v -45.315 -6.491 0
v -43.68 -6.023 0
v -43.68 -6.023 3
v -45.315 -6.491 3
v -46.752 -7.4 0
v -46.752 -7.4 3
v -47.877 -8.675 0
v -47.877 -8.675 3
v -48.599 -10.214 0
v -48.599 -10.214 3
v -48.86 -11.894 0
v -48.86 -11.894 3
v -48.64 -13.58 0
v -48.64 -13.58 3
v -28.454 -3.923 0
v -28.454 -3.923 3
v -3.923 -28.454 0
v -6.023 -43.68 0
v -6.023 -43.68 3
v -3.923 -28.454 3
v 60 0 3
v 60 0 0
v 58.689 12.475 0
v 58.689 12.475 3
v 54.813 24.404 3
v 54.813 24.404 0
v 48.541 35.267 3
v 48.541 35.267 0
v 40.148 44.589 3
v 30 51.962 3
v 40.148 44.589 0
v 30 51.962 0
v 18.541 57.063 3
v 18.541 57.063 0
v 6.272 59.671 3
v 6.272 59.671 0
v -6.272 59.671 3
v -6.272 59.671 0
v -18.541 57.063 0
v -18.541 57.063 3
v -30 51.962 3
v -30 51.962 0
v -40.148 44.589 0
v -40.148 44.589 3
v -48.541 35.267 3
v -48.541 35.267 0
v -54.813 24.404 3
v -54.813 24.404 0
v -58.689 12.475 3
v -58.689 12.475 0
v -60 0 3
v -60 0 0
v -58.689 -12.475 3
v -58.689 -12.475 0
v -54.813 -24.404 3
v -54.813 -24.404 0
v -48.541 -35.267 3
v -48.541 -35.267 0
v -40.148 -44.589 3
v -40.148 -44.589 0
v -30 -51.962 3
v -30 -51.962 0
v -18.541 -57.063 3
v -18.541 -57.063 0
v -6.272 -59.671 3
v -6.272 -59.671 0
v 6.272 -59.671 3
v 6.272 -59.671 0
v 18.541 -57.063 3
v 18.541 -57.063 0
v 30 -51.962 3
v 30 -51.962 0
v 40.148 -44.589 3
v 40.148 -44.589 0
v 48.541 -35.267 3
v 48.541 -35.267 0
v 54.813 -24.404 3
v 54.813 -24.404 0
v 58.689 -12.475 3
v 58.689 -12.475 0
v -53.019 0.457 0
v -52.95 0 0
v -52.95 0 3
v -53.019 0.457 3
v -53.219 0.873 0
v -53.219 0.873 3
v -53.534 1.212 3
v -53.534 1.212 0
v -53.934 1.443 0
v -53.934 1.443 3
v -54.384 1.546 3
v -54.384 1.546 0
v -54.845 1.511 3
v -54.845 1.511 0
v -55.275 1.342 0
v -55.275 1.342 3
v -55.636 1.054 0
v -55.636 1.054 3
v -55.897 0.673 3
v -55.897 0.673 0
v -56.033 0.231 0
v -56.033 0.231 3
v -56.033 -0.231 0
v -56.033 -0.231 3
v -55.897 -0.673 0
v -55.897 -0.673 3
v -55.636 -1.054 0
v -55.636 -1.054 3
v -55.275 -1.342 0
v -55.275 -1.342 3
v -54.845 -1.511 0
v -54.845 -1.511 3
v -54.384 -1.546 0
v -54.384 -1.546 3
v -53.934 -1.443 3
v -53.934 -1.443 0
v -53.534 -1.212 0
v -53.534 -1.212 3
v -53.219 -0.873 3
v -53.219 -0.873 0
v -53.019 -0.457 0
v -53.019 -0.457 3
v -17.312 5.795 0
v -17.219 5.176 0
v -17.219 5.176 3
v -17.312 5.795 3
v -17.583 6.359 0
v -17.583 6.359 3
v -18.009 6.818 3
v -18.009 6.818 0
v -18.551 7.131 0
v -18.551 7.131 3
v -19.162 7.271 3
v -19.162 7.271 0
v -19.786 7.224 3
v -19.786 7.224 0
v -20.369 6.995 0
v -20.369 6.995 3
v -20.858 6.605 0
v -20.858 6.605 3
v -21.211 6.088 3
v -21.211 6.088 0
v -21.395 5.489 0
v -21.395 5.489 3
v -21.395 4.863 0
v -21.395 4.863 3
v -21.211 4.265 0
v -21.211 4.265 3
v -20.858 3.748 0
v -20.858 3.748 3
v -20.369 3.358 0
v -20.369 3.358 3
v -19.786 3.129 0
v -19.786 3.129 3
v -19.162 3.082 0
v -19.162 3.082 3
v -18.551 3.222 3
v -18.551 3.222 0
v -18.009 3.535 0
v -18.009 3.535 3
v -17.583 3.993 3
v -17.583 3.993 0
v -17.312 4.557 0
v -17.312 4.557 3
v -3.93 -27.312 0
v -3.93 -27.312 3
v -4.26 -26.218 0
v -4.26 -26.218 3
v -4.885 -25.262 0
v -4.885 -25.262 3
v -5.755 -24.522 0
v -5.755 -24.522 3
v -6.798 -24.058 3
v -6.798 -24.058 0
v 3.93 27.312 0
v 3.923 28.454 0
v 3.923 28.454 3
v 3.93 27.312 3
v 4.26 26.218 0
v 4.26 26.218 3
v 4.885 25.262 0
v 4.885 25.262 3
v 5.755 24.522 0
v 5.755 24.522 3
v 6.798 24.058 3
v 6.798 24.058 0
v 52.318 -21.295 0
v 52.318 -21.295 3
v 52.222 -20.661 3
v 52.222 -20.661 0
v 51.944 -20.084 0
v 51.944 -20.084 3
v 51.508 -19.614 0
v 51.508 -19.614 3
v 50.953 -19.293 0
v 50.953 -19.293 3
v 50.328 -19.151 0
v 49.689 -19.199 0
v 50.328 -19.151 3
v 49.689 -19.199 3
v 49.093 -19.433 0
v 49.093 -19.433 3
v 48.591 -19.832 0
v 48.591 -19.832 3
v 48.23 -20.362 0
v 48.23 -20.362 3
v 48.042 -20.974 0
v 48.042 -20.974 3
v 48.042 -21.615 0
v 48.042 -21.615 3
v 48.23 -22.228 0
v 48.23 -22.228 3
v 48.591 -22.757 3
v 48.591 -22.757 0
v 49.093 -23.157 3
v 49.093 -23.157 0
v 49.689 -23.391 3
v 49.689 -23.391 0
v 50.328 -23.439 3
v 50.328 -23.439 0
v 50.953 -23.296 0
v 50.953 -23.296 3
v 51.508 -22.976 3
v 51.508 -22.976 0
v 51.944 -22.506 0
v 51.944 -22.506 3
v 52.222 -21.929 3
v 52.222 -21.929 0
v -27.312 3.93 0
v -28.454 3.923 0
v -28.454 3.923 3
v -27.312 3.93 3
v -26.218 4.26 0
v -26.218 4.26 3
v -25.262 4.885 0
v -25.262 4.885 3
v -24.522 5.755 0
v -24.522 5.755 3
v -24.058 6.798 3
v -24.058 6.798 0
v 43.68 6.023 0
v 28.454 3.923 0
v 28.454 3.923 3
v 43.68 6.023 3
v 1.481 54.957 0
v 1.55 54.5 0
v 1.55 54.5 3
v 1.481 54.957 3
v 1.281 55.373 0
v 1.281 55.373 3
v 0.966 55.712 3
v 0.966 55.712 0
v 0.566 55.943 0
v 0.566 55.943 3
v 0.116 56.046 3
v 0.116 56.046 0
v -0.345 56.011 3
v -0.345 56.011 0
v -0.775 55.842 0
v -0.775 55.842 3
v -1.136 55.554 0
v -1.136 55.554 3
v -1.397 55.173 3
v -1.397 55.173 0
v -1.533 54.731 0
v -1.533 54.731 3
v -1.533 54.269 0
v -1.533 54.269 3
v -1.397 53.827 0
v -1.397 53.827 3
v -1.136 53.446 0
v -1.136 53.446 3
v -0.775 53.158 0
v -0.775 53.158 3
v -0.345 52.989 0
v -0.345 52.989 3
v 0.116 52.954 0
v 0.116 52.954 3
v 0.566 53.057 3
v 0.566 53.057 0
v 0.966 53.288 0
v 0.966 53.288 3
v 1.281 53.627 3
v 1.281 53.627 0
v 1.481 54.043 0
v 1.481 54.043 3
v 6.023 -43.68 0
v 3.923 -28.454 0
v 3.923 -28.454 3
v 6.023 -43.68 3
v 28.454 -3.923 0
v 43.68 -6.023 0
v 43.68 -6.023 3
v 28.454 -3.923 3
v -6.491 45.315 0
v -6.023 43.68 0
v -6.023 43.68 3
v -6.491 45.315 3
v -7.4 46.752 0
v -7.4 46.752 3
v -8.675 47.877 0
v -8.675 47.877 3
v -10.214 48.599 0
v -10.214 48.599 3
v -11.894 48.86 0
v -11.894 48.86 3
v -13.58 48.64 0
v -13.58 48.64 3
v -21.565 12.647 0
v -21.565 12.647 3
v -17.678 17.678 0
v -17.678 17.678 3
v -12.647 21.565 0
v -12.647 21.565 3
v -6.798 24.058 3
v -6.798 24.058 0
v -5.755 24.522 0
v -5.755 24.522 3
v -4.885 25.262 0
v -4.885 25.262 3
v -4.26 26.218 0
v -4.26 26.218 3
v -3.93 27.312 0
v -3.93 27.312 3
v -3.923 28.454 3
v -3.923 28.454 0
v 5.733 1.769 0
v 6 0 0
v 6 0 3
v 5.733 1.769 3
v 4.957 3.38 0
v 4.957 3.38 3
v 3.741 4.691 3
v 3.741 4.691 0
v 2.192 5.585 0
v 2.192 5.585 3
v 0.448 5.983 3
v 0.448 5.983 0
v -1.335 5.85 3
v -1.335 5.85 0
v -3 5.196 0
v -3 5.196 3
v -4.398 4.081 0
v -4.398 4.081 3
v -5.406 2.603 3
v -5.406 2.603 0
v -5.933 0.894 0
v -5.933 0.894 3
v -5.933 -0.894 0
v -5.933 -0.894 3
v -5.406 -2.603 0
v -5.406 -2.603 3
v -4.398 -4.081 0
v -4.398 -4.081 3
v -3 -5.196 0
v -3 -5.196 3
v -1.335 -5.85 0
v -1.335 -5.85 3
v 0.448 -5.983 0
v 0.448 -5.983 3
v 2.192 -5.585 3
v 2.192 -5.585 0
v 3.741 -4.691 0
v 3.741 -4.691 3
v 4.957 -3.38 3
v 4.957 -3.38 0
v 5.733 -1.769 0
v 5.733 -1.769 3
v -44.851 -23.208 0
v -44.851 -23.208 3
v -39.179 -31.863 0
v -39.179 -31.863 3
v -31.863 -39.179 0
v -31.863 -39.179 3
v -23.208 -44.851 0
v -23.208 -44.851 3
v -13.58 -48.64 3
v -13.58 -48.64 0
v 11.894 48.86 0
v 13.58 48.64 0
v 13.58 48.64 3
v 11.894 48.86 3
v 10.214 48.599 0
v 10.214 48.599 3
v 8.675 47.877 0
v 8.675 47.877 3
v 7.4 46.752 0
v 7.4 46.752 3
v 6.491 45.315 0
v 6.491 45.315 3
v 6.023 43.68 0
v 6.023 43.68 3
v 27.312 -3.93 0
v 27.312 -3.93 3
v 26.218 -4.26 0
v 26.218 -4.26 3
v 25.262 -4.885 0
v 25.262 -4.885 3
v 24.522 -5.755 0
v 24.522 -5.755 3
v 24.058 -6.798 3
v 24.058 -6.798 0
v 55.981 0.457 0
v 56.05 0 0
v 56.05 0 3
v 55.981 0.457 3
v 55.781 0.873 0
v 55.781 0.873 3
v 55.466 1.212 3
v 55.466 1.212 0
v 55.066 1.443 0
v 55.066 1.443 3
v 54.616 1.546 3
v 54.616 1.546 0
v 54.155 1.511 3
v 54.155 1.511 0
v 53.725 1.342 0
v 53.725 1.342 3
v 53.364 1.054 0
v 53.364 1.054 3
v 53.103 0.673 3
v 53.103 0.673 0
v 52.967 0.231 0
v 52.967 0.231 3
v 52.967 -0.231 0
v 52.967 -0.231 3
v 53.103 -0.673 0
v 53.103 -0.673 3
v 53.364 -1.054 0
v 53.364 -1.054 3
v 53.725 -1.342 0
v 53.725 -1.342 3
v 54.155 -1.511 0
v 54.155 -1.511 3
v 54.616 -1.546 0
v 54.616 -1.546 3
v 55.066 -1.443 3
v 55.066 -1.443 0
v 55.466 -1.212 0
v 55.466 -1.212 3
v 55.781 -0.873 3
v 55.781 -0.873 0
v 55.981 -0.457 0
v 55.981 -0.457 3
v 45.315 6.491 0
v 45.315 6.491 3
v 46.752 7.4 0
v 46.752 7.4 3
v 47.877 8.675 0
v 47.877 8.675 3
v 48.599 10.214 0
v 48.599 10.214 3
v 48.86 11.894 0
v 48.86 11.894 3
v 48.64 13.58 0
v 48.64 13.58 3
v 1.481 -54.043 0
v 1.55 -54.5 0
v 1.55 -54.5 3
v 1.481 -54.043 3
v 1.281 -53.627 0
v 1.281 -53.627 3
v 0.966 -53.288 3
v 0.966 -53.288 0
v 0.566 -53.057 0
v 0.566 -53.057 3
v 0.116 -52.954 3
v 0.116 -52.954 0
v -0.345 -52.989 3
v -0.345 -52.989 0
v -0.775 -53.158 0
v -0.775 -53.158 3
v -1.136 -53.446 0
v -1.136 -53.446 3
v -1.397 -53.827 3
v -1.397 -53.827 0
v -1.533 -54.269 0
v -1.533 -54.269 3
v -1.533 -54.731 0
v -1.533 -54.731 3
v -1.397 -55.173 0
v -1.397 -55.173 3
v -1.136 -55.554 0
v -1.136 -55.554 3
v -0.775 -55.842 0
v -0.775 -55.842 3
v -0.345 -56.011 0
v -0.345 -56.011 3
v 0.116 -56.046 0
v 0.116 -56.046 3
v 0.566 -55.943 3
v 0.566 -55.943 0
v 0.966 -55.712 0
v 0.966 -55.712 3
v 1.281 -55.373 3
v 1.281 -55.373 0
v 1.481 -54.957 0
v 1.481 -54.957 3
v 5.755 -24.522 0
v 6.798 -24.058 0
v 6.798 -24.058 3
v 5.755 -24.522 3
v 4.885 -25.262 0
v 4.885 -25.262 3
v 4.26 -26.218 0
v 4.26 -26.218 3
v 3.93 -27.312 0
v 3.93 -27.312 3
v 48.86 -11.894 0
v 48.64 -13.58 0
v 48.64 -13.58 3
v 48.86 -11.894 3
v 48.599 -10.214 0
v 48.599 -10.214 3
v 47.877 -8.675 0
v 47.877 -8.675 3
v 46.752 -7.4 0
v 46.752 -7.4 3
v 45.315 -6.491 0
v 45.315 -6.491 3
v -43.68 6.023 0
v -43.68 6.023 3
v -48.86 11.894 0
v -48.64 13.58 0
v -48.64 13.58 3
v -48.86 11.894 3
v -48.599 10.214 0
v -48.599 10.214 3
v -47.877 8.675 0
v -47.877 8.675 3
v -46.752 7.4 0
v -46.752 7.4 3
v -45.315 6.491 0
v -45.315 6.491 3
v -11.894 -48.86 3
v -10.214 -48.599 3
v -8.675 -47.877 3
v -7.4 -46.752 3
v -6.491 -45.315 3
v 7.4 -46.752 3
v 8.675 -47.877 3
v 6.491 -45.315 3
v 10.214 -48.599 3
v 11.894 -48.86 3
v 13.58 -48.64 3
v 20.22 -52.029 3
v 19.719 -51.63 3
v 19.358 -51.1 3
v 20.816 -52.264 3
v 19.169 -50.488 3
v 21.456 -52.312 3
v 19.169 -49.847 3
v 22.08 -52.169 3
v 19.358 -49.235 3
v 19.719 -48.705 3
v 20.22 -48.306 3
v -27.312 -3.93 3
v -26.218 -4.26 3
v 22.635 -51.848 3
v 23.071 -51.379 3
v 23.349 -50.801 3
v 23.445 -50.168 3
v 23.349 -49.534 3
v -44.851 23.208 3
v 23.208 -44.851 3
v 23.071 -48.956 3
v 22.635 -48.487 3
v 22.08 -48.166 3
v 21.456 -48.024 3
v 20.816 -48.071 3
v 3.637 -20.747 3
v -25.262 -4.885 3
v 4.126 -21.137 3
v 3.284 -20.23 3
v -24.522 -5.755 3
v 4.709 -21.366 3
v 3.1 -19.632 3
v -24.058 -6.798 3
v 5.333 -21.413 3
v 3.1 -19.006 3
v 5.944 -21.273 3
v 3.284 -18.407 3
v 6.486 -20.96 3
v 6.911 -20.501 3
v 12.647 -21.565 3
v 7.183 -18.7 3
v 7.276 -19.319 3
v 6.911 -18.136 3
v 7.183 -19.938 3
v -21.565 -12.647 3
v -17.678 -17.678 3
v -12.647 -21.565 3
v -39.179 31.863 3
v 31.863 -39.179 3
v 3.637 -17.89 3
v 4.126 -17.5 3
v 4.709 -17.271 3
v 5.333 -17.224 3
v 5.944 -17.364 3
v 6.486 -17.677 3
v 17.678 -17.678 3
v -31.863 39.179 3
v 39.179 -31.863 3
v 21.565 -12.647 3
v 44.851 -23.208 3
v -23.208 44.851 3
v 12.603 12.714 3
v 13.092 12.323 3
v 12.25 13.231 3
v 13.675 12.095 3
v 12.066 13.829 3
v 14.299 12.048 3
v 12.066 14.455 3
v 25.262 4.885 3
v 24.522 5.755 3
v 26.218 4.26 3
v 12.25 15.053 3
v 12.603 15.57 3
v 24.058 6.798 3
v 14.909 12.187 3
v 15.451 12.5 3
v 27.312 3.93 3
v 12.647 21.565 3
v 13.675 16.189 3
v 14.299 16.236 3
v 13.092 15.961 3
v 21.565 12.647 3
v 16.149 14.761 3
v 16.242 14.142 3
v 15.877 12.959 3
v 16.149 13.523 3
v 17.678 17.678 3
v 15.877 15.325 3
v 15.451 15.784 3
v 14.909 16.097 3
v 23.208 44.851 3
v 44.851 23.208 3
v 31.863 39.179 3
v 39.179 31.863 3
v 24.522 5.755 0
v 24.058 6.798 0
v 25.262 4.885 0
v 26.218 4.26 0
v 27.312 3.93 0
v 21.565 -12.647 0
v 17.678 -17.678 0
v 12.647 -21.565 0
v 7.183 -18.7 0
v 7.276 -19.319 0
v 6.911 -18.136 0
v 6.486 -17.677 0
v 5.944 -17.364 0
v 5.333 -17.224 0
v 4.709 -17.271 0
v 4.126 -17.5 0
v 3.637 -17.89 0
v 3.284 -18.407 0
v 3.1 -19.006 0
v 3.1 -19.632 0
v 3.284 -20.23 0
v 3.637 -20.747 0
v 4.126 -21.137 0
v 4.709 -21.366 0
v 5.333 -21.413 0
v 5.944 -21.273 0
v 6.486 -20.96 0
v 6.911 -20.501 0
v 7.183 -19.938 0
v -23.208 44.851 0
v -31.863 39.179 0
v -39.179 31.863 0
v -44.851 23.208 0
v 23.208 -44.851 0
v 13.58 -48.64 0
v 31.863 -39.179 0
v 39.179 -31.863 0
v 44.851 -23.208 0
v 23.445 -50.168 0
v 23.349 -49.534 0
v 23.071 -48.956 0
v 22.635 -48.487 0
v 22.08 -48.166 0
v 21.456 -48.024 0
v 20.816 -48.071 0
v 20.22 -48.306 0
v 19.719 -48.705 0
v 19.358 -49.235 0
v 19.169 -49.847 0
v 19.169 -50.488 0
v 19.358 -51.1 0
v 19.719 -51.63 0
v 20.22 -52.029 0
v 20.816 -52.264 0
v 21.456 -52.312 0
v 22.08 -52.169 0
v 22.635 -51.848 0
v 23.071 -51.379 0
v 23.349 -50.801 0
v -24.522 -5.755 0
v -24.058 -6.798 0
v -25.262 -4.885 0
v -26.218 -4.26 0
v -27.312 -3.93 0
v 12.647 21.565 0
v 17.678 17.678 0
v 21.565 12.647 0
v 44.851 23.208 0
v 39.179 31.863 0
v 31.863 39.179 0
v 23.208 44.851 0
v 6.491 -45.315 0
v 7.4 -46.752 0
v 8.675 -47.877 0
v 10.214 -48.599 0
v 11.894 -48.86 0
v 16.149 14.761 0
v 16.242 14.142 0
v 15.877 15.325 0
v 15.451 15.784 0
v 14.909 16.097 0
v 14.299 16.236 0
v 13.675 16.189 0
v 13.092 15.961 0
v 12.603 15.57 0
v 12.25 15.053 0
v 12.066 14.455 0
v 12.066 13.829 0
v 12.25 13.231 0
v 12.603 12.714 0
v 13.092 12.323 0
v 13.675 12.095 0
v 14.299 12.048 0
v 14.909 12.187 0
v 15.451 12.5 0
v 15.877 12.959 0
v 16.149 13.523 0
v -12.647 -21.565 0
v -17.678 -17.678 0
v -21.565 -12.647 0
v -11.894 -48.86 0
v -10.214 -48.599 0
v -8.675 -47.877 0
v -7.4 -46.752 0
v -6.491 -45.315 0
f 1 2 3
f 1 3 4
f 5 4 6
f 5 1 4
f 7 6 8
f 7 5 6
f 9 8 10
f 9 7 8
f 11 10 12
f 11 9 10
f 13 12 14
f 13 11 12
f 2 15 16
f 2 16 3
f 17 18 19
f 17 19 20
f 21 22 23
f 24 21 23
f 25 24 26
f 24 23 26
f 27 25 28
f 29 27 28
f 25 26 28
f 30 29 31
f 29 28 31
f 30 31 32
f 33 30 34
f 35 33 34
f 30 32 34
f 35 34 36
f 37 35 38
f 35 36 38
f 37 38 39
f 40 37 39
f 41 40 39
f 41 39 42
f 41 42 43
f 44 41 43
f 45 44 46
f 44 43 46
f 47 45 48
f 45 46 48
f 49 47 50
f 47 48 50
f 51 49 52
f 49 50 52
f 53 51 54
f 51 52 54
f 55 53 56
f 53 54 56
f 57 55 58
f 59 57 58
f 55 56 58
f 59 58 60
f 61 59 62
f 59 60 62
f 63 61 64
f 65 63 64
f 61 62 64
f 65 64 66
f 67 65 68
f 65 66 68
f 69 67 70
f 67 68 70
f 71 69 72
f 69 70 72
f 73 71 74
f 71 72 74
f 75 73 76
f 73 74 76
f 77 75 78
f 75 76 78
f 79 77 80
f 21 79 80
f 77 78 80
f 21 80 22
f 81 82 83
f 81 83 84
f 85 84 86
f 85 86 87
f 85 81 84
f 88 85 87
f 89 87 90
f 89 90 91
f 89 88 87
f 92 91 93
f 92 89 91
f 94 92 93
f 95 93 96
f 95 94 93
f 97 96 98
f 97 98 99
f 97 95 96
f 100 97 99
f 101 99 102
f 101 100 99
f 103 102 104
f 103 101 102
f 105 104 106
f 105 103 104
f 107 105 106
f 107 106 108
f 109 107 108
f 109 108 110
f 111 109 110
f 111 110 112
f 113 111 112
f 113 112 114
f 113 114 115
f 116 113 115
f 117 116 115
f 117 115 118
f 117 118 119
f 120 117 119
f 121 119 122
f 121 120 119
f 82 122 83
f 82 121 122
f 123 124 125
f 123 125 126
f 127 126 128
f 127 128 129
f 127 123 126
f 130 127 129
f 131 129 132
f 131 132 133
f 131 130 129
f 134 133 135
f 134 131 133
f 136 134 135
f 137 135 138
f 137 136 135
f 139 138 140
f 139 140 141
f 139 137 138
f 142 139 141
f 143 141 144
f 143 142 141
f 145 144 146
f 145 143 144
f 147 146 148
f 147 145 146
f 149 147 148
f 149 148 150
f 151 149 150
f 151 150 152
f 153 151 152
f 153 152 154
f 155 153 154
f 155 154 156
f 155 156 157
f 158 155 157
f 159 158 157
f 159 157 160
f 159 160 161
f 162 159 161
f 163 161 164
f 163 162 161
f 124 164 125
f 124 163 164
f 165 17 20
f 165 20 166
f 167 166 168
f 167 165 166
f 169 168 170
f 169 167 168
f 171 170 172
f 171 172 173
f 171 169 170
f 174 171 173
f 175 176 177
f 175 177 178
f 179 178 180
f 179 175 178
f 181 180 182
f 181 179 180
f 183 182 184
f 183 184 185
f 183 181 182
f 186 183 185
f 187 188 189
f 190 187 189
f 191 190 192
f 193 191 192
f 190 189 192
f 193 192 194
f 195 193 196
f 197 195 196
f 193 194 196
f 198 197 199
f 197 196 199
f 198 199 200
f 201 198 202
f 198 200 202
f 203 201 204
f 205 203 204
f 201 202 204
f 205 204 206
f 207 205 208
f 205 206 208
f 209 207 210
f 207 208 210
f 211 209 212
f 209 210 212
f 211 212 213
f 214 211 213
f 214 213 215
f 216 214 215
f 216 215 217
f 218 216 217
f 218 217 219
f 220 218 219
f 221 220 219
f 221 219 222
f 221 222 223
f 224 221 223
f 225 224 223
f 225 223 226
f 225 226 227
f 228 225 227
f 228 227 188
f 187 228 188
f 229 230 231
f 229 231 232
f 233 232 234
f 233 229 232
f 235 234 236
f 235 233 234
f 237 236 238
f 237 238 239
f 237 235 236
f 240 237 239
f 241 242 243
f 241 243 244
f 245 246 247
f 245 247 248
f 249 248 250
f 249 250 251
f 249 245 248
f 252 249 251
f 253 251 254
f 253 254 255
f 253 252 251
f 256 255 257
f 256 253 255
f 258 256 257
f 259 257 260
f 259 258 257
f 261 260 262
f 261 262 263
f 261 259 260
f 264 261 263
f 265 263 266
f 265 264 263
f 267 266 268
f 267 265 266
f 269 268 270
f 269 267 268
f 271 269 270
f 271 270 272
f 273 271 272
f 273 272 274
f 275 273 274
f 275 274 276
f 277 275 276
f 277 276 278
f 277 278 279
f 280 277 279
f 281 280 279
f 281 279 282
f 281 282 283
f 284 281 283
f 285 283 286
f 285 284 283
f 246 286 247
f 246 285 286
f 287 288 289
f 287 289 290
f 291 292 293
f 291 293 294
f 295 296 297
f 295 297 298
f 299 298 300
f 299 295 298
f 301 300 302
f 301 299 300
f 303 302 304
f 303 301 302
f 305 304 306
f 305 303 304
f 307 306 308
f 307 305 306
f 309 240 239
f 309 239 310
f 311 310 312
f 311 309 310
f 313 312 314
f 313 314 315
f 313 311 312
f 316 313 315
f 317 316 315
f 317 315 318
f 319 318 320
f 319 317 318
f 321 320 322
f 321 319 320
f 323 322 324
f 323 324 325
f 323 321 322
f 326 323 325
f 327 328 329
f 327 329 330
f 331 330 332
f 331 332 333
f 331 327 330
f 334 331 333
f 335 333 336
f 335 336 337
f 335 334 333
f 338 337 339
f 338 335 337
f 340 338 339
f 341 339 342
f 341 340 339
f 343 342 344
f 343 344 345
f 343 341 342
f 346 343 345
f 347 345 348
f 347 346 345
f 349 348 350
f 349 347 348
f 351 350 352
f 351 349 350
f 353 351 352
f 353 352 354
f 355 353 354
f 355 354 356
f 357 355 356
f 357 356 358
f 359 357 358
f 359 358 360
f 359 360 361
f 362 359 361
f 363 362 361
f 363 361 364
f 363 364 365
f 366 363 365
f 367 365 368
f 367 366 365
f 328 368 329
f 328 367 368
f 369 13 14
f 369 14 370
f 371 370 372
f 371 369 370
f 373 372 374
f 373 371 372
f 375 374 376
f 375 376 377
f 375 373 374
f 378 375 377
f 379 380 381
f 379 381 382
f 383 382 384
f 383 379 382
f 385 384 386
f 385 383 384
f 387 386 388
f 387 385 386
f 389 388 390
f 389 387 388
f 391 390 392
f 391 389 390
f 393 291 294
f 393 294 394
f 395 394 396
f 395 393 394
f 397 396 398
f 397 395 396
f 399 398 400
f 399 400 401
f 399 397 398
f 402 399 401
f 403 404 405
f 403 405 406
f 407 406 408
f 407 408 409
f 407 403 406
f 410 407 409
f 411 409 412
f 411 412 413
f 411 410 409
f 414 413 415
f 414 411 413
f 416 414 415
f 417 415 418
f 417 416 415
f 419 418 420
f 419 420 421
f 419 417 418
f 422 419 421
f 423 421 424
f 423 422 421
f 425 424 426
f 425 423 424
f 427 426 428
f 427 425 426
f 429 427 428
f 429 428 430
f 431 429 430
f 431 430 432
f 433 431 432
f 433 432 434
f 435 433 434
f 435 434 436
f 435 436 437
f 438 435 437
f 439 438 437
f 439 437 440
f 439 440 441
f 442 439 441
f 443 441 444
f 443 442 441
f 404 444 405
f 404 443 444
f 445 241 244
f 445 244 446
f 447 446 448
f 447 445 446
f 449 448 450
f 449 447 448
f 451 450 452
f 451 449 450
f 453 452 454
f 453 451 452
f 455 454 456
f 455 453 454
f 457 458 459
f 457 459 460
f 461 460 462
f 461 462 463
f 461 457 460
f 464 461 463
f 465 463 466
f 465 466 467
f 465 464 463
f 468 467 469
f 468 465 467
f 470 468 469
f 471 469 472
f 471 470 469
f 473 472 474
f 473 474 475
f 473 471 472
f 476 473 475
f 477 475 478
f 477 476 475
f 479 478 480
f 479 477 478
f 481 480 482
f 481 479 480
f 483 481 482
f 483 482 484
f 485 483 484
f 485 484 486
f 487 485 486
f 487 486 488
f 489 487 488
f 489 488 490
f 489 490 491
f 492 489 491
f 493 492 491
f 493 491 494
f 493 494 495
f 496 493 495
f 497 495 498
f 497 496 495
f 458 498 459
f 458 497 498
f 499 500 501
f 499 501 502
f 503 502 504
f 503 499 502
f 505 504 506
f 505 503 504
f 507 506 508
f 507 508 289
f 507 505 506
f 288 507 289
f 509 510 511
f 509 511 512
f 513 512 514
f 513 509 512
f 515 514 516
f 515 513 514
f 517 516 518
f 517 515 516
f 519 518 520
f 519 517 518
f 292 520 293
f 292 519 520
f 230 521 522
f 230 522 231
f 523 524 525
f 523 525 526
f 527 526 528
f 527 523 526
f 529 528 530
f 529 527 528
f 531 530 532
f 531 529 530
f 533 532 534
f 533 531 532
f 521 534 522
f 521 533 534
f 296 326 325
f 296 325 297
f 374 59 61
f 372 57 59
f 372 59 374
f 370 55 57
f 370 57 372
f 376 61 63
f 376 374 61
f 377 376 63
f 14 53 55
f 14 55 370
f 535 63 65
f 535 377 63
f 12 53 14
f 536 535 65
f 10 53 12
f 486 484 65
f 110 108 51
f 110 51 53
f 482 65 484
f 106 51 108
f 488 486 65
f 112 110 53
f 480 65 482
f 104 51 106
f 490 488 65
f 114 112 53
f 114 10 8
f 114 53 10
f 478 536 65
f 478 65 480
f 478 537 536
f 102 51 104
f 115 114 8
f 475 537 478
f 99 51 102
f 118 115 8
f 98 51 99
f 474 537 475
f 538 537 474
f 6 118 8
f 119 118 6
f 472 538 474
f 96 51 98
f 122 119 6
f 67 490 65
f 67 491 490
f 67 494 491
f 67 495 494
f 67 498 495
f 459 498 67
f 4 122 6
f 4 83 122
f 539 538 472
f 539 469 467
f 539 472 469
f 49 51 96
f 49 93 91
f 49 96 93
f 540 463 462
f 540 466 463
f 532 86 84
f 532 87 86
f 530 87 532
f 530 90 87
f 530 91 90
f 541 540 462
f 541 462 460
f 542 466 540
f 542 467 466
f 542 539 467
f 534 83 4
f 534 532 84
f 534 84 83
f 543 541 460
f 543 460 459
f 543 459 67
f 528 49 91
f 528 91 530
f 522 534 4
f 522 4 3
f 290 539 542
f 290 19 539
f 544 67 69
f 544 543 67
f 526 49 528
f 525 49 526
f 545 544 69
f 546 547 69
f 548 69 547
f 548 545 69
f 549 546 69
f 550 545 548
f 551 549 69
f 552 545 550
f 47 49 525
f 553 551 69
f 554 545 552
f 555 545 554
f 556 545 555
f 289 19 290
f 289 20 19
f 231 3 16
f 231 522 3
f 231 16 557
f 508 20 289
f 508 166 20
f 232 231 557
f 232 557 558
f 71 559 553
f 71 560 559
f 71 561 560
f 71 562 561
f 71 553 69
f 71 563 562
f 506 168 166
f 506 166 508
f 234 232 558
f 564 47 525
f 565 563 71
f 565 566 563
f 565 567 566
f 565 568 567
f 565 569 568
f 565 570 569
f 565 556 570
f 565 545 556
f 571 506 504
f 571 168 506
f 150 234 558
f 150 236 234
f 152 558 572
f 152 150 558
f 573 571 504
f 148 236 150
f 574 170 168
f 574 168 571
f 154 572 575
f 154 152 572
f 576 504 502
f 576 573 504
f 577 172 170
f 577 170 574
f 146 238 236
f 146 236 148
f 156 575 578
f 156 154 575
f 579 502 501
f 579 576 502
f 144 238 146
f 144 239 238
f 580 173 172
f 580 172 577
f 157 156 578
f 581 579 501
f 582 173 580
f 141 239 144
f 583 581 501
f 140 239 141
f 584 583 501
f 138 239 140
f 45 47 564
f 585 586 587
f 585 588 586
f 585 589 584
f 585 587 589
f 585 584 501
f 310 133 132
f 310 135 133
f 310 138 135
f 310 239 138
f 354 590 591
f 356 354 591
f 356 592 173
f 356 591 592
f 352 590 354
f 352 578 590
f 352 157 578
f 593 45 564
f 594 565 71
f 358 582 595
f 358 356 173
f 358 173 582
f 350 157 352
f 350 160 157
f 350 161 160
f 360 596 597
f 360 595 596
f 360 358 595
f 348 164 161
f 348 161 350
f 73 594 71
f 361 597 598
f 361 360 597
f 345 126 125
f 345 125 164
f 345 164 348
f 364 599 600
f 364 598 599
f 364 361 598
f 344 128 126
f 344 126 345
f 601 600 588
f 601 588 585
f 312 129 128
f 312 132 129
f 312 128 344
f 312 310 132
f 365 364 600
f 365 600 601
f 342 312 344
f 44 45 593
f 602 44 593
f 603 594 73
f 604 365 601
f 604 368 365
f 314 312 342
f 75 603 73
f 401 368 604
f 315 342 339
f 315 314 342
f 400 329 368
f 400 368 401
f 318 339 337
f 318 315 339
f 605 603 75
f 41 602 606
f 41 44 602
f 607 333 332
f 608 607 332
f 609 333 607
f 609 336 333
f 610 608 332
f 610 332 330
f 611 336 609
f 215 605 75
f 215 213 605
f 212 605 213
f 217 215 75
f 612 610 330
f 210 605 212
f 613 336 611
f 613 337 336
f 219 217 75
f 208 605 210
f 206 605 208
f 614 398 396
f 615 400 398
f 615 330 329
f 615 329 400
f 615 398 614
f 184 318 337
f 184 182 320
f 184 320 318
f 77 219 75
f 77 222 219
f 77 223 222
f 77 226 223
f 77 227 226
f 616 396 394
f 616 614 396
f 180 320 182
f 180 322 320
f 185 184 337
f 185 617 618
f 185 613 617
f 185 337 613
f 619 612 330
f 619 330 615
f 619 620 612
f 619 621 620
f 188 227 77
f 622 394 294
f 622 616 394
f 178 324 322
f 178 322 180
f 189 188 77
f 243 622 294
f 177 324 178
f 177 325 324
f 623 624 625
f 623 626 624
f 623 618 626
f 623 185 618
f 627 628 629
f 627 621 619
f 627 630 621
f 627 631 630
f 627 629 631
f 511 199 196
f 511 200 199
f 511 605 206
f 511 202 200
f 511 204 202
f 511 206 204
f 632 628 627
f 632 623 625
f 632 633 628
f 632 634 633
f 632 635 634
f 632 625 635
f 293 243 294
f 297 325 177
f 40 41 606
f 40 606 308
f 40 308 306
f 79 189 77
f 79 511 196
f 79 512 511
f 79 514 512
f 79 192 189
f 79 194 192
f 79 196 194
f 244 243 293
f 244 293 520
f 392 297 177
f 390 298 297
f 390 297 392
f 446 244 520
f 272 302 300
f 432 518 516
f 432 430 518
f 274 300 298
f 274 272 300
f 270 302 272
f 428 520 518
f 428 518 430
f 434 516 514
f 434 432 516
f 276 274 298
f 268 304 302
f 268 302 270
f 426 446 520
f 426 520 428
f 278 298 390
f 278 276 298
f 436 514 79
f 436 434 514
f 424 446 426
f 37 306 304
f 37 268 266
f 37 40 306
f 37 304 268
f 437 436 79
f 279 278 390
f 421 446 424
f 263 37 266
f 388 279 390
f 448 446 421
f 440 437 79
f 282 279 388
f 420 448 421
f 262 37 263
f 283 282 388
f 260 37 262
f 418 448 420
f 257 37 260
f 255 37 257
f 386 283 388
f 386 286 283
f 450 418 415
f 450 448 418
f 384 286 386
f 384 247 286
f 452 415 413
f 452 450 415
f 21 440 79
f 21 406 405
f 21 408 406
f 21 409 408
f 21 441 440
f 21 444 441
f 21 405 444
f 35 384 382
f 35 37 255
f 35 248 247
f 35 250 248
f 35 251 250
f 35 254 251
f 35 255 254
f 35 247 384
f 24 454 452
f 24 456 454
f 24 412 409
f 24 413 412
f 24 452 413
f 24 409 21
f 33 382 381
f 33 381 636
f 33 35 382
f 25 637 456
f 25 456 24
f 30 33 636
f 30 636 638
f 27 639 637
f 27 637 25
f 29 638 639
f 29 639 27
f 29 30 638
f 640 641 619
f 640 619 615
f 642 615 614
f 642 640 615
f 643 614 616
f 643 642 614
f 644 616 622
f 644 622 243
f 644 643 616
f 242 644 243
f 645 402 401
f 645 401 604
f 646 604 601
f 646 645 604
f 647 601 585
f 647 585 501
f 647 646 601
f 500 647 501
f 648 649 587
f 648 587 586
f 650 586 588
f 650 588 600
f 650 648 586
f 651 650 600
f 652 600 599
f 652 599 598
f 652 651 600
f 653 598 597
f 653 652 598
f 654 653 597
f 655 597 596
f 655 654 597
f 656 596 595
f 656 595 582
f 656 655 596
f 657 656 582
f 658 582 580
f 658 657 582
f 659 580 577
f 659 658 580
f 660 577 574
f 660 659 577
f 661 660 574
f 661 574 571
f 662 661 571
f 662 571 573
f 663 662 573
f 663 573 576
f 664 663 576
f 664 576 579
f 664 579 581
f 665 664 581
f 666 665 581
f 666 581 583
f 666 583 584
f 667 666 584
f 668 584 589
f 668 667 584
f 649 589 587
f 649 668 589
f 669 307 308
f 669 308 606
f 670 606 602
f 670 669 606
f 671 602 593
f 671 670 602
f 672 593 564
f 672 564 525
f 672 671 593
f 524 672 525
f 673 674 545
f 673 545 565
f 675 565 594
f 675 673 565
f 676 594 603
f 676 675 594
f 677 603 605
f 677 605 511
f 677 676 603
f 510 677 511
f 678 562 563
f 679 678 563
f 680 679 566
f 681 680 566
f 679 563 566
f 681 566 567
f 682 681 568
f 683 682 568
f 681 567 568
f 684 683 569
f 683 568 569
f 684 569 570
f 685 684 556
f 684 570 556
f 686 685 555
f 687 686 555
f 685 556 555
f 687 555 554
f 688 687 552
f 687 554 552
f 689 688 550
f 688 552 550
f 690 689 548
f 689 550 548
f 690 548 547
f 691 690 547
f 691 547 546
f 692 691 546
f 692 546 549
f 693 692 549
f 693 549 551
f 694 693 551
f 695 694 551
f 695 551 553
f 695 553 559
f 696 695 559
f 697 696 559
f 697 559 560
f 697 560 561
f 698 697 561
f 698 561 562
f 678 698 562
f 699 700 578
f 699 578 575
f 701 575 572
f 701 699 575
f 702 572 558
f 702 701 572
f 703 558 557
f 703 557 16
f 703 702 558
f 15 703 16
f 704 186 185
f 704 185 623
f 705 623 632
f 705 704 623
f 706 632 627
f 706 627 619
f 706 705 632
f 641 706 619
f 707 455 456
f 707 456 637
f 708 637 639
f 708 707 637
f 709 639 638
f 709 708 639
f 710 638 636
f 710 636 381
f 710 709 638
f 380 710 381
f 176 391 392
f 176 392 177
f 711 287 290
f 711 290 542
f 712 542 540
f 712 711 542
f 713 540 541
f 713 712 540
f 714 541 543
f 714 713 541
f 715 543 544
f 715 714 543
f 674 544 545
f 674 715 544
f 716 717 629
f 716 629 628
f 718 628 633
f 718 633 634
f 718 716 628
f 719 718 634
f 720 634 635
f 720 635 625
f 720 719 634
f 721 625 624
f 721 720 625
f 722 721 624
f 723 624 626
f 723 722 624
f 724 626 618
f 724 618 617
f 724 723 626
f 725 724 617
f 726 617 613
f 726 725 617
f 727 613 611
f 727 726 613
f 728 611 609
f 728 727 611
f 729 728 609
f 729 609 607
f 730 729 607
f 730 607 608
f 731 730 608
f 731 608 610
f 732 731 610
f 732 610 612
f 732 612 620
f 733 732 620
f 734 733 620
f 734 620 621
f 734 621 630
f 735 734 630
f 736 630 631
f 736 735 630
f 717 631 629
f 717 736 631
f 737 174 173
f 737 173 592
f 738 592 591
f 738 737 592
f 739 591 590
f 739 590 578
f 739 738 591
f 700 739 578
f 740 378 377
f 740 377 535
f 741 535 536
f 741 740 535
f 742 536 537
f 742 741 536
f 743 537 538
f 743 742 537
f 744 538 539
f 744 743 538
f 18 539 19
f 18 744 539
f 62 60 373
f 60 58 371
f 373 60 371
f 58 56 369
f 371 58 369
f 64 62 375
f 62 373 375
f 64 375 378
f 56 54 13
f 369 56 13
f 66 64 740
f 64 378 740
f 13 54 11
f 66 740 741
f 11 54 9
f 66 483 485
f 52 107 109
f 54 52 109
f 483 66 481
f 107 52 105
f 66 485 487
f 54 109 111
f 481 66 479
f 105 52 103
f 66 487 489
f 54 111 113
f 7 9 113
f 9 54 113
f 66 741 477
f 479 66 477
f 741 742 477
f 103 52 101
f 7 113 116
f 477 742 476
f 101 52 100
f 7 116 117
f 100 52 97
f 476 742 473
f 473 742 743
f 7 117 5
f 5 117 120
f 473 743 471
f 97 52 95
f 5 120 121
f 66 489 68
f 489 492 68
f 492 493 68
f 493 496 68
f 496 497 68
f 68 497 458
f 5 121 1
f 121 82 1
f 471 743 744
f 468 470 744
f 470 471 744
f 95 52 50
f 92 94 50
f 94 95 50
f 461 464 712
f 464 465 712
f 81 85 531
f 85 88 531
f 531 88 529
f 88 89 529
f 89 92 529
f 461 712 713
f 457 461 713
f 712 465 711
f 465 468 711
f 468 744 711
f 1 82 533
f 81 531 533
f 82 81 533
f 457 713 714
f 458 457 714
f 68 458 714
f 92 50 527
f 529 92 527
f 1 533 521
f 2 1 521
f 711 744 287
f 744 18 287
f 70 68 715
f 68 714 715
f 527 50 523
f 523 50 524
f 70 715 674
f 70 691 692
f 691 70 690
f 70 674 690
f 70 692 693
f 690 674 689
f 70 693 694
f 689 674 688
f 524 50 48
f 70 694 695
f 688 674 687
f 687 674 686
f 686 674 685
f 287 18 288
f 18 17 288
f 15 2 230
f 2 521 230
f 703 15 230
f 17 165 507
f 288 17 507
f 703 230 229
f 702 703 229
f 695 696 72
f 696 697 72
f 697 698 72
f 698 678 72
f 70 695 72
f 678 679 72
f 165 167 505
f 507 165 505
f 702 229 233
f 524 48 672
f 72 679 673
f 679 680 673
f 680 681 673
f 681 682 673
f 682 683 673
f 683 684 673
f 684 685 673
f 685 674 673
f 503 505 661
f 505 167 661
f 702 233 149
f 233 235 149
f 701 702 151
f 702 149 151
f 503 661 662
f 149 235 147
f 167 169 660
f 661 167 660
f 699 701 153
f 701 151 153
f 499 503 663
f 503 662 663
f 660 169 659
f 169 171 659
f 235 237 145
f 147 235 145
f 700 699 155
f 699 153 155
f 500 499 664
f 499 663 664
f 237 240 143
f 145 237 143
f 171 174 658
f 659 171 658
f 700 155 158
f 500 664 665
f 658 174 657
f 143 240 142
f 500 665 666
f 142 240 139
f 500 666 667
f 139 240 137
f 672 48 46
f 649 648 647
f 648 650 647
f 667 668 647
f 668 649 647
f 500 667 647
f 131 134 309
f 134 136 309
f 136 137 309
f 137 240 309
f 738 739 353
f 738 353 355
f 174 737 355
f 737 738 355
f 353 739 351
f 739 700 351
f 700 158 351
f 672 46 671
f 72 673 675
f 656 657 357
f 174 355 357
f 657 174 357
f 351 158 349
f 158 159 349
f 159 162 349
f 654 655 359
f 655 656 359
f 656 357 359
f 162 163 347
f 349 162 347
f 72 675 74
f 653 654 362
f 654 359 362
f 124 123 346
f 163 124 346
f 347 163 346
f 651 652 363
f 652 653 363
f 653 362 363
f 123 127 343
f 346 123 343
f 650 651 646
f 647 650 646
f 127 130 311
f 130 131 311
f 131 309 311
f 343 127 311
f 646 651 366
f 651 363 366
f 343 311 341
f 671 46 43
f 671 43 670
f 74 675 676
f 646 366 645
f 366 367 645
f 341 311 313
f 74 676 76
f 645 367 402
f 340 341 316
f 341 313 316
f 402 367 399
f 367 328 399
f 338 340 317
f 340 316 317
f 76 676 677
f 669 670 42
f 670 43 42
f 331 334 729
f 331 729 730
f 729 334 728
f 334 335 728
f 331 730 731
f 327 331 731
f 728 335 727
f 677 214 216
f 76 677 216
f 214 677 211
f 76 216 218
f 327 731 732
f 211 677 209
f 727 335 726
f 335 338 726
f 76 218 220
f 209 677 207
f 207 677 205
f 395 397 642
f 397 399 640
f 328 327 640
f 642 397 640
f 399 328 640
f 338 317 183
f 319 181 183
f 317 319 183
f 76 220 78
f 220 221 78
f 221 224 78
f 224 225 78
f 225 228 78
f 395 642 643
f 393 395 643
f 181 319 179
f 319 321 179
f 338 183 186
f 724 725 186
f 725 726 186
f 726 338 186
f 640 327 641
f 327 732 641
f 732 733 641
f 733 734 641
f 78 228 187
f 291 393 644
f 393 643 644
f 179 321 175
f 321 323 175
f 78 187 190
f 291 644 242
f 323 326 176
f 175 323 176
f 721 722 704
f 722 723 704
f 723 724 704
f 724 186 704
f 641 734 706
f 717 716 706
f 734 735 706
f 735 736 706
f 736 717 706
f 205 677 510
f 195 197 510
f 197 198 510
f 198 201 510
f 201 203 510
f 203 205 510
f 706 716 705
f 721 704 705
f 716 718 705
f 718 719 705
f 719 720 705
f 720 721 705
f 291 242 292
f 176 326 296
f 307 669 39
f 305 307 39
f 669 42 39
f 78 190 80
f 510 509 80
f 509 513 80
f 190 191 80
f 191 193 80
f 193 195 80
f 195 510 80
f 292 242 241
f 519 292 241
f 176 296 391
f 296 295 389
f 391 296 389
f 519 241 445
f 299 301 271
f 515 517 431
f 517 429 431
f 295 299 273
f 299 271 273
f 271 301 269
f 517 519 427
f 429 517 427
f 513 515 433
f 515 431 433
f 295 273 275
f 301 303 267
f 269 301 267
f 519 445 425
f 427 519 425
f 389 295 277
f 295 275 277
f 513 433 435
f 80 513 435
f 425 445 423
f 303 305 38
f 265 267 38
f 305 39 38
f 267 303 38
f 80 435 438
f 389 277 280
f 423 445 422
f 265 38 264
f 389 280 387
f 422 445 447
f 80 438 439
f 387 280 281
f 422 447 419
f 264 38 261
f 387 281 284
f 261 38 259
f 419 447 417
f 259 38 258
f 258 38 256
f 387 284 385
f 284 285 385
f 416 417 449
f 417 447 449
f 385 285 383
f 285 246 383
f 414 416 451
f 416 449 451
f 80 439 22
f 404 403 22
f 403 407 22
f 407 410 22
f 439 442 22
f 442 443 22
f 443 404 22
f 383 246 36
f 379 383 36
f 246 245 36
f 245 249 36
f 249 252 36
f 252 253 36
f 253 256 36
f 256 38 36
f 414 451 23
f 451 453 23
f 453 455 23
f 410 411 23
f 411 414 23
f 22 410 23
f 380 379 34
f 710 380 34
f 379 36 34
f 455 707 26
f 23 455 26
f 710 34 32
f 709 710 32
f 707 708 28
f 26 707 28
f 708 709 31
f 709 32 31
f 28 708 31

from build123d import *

# Parameters (mm, degrees)
SKETCH_1_R         = 60
SKETCH_1_R_2       = 1.55
SKETCH_1_R_3       = 2.1
SKETCH_1_R_4       = 6
EXTRUDE_1_DEPTH    = 3
SKETCH1_R          = 2.15
CUT_EXTRUDE1_DEPTH = 10


with BuildPart() as part:
    # 草图1 → 凸台-拉伸1 (new body)
    with BuildSketch(Plane.XY):
        Circle(SKETCH_1_R)
        with Locations((0, 54.5)):
            Circle(SKETCH_1_R_2, mode=Mode.SUBTRACT)
        with Locations((-54.5, 0)):
            Circle(SKETCH_1_R_2, mode=Mode.SUBTRACT)
        with Locations((0, -54.5)):
            Circle(SKETCH_1_R_2, mode=Mode.SUBTRACT)
        with Locations((54.5, 0)):
            Circle(SKETCH_1_R_2, mode=Mode.SUBTRACT)
        with Locations((14.142135624, 14.142135624)):
            Circle(SKETCH_1_R_3, mode=Mode.SUBTRACT)
        with Locations((5.176380902, -19.318516526)):
            Circle(SKETCH_1_R_3, mode=Mode.SUBTRACT)
        with Locations((-19.318516526, 5.176380902)):
            Circle(SKETCH_1_R_3, mode=Mode.SUBTRACT)
        Circle(SKETCH_1_R_4, mode=Mode.SUBTRACT)
        with BuildLine():
            Line((3.923217687, -28.453617749), (6.022703538, -43.680396542))
            ThreePointArc((6.022703538, -43.680396542), (8.67451724, -47.877141015), (13.579927123, -48.639855873))
            ThreePointArc((13.579927123, -48.639855873), (35.70889245, -35.70889245), (48.639855873, -13.579927123))
            ThreePointArc((48.639855873, -13.579927123), (47.877141015, -8.67451724), (43.680396542, -6.022703538))
            Line((43.680396542, -6.022703538), (28.453617749, -3.923217687))
            ThreePointArc((28.453617749, -3.923217687), (25.717860997, -4.538114468), (24.057984584, -6.7980422))
            ThreePointArc((24.057984584, -6.7980422), (17.67766953, -17.67766953), (6.7980422, -24.057984584))
            ThreePointArc((6.7980422, -24.057984584), (4.538114468, -25.717860997), (3.923217687, -28.453617749))
        make_face(mode=Mode.SUBTRACT)
        with BuildLine():
            Line((28.453617749, 3.923217687), (43.680396542, 6.022703538))
            ThreePointArc((43.680396542, 6.022703538), (47.877141015, 8.67451724), (48.639855873, 13.579927123))
            ThreePointArc((48.639855873, 13.579927123), (35.70889245, 35.70889245), (13.579927123, 48.639855873))
            ThreePointArc((13.579927123, 48.639855873), (8.67451724, 47.877141015), (6.022703538, 43.680396542))
            Line((6.022703538, 43.680396542), (3.923217687, 28.453617749))
            ThreePointArc((3.923217687, 28.453617749), (4.538114468, 25.717860997), (6.7980422, 24.057984584))
            ThreePointArc((6.7980422, 24.057984584), (17.67766953, 17.67766953), (24.057984584, 6.7980422))
            ThreePointArc((24.057984584, 6.7980422), (25.717860997, 4.538114468), (28.453617749, 3.923217687))
        make_face(mode=Mode.SUBTRACT)
        with BuildLine():
            Line((-28.453617749, -3.923217687), (-43.680396542, -6.022703538))
            ThreePointArc((-43.680396542, -6.022703538), (-47.877141015, -8.67451724), (-48.639855873, -13.579927123))
            ThreePointArc((-48.639855873, -13.579927123), (-35.70889245, -35.70889245), (-13.579927123, -48.639855873))
            ThreePointArc((-13.579927123, -48.639855873), (-8.67451724, -47.877141015), (-6.022703538, -43.680396542))
            Line((-6.022703538, -43.680396542), (-3.923217687, -28.453617749))
            ThreePointArc((-3.923217687, -28.453617749), (-4.538114468, -25.717860997), (-6.7980422, -24.057984584))
            ThreePointArc((-6.7980422, -24.057984584), (-17.67766953, -17.67766953), (-24.057984584, -6.7980422))
            ThreePointArc((-24.057984584, -6.7980422), (-25.717860997, -4.538114468), (-28.453617749, -3.923217687))
        make_face(mode=Mode.SUBTRACT)
        with BuildLine():
            Line((-3.923217687, 28.453617749), (-6.022703538, 43.680396542))
            ThreePointArc((-6.022703538, 43.680396542), (-8.67451724, 47.877141015), (-13.579927123, 48.639855873))
            ThreePointArc((-13.579927123, 48.639855873), (-35.70889245, 35.70889245), (-48.639855873, 13.579927123))
            ThreePointArc((-48.639855873, 13.579927123), (-47.877141015, 8.67451724), (-43.680396542, 6.022703538))
            Line((-43.680396542, 6.022703538), (-28.453617749, 3.923217687))
            ThreePointArc((-28.453617749, 3.923217687), (-25.717860997, 4.538114468), (-24.057984584, 6.7980422))
            ThreePointArc((-24.057984584, 6.7980422), (-17.67766953, 17.67766953), (-6.7980422, 24.057984584))
            ThreePointArc((-6.7980422, 24.057984584), (-4.538114468, 25.717860997), (-3.923217687, 28.453617749))
        make_face(mode=Mode.SUBTRACT)
    extrude(amount=EXTRUDE_1_DEPTH)

    # Sketch1 → Cut-Extrude1 (cut)
    with BuildSketch(Plane.XY.offset(3)):
        with Locations((50.167514513, -21.294846503)):
            Circle(SKETCH1_R)
        with Locations((21.294846503, -50.167514513)):
            Circle(SKETCH1_R)
    extrude(amount=-CUT_EXTRUDE1_DEPTH, mode=Mode.SUBTRACT)


solid = part.part
